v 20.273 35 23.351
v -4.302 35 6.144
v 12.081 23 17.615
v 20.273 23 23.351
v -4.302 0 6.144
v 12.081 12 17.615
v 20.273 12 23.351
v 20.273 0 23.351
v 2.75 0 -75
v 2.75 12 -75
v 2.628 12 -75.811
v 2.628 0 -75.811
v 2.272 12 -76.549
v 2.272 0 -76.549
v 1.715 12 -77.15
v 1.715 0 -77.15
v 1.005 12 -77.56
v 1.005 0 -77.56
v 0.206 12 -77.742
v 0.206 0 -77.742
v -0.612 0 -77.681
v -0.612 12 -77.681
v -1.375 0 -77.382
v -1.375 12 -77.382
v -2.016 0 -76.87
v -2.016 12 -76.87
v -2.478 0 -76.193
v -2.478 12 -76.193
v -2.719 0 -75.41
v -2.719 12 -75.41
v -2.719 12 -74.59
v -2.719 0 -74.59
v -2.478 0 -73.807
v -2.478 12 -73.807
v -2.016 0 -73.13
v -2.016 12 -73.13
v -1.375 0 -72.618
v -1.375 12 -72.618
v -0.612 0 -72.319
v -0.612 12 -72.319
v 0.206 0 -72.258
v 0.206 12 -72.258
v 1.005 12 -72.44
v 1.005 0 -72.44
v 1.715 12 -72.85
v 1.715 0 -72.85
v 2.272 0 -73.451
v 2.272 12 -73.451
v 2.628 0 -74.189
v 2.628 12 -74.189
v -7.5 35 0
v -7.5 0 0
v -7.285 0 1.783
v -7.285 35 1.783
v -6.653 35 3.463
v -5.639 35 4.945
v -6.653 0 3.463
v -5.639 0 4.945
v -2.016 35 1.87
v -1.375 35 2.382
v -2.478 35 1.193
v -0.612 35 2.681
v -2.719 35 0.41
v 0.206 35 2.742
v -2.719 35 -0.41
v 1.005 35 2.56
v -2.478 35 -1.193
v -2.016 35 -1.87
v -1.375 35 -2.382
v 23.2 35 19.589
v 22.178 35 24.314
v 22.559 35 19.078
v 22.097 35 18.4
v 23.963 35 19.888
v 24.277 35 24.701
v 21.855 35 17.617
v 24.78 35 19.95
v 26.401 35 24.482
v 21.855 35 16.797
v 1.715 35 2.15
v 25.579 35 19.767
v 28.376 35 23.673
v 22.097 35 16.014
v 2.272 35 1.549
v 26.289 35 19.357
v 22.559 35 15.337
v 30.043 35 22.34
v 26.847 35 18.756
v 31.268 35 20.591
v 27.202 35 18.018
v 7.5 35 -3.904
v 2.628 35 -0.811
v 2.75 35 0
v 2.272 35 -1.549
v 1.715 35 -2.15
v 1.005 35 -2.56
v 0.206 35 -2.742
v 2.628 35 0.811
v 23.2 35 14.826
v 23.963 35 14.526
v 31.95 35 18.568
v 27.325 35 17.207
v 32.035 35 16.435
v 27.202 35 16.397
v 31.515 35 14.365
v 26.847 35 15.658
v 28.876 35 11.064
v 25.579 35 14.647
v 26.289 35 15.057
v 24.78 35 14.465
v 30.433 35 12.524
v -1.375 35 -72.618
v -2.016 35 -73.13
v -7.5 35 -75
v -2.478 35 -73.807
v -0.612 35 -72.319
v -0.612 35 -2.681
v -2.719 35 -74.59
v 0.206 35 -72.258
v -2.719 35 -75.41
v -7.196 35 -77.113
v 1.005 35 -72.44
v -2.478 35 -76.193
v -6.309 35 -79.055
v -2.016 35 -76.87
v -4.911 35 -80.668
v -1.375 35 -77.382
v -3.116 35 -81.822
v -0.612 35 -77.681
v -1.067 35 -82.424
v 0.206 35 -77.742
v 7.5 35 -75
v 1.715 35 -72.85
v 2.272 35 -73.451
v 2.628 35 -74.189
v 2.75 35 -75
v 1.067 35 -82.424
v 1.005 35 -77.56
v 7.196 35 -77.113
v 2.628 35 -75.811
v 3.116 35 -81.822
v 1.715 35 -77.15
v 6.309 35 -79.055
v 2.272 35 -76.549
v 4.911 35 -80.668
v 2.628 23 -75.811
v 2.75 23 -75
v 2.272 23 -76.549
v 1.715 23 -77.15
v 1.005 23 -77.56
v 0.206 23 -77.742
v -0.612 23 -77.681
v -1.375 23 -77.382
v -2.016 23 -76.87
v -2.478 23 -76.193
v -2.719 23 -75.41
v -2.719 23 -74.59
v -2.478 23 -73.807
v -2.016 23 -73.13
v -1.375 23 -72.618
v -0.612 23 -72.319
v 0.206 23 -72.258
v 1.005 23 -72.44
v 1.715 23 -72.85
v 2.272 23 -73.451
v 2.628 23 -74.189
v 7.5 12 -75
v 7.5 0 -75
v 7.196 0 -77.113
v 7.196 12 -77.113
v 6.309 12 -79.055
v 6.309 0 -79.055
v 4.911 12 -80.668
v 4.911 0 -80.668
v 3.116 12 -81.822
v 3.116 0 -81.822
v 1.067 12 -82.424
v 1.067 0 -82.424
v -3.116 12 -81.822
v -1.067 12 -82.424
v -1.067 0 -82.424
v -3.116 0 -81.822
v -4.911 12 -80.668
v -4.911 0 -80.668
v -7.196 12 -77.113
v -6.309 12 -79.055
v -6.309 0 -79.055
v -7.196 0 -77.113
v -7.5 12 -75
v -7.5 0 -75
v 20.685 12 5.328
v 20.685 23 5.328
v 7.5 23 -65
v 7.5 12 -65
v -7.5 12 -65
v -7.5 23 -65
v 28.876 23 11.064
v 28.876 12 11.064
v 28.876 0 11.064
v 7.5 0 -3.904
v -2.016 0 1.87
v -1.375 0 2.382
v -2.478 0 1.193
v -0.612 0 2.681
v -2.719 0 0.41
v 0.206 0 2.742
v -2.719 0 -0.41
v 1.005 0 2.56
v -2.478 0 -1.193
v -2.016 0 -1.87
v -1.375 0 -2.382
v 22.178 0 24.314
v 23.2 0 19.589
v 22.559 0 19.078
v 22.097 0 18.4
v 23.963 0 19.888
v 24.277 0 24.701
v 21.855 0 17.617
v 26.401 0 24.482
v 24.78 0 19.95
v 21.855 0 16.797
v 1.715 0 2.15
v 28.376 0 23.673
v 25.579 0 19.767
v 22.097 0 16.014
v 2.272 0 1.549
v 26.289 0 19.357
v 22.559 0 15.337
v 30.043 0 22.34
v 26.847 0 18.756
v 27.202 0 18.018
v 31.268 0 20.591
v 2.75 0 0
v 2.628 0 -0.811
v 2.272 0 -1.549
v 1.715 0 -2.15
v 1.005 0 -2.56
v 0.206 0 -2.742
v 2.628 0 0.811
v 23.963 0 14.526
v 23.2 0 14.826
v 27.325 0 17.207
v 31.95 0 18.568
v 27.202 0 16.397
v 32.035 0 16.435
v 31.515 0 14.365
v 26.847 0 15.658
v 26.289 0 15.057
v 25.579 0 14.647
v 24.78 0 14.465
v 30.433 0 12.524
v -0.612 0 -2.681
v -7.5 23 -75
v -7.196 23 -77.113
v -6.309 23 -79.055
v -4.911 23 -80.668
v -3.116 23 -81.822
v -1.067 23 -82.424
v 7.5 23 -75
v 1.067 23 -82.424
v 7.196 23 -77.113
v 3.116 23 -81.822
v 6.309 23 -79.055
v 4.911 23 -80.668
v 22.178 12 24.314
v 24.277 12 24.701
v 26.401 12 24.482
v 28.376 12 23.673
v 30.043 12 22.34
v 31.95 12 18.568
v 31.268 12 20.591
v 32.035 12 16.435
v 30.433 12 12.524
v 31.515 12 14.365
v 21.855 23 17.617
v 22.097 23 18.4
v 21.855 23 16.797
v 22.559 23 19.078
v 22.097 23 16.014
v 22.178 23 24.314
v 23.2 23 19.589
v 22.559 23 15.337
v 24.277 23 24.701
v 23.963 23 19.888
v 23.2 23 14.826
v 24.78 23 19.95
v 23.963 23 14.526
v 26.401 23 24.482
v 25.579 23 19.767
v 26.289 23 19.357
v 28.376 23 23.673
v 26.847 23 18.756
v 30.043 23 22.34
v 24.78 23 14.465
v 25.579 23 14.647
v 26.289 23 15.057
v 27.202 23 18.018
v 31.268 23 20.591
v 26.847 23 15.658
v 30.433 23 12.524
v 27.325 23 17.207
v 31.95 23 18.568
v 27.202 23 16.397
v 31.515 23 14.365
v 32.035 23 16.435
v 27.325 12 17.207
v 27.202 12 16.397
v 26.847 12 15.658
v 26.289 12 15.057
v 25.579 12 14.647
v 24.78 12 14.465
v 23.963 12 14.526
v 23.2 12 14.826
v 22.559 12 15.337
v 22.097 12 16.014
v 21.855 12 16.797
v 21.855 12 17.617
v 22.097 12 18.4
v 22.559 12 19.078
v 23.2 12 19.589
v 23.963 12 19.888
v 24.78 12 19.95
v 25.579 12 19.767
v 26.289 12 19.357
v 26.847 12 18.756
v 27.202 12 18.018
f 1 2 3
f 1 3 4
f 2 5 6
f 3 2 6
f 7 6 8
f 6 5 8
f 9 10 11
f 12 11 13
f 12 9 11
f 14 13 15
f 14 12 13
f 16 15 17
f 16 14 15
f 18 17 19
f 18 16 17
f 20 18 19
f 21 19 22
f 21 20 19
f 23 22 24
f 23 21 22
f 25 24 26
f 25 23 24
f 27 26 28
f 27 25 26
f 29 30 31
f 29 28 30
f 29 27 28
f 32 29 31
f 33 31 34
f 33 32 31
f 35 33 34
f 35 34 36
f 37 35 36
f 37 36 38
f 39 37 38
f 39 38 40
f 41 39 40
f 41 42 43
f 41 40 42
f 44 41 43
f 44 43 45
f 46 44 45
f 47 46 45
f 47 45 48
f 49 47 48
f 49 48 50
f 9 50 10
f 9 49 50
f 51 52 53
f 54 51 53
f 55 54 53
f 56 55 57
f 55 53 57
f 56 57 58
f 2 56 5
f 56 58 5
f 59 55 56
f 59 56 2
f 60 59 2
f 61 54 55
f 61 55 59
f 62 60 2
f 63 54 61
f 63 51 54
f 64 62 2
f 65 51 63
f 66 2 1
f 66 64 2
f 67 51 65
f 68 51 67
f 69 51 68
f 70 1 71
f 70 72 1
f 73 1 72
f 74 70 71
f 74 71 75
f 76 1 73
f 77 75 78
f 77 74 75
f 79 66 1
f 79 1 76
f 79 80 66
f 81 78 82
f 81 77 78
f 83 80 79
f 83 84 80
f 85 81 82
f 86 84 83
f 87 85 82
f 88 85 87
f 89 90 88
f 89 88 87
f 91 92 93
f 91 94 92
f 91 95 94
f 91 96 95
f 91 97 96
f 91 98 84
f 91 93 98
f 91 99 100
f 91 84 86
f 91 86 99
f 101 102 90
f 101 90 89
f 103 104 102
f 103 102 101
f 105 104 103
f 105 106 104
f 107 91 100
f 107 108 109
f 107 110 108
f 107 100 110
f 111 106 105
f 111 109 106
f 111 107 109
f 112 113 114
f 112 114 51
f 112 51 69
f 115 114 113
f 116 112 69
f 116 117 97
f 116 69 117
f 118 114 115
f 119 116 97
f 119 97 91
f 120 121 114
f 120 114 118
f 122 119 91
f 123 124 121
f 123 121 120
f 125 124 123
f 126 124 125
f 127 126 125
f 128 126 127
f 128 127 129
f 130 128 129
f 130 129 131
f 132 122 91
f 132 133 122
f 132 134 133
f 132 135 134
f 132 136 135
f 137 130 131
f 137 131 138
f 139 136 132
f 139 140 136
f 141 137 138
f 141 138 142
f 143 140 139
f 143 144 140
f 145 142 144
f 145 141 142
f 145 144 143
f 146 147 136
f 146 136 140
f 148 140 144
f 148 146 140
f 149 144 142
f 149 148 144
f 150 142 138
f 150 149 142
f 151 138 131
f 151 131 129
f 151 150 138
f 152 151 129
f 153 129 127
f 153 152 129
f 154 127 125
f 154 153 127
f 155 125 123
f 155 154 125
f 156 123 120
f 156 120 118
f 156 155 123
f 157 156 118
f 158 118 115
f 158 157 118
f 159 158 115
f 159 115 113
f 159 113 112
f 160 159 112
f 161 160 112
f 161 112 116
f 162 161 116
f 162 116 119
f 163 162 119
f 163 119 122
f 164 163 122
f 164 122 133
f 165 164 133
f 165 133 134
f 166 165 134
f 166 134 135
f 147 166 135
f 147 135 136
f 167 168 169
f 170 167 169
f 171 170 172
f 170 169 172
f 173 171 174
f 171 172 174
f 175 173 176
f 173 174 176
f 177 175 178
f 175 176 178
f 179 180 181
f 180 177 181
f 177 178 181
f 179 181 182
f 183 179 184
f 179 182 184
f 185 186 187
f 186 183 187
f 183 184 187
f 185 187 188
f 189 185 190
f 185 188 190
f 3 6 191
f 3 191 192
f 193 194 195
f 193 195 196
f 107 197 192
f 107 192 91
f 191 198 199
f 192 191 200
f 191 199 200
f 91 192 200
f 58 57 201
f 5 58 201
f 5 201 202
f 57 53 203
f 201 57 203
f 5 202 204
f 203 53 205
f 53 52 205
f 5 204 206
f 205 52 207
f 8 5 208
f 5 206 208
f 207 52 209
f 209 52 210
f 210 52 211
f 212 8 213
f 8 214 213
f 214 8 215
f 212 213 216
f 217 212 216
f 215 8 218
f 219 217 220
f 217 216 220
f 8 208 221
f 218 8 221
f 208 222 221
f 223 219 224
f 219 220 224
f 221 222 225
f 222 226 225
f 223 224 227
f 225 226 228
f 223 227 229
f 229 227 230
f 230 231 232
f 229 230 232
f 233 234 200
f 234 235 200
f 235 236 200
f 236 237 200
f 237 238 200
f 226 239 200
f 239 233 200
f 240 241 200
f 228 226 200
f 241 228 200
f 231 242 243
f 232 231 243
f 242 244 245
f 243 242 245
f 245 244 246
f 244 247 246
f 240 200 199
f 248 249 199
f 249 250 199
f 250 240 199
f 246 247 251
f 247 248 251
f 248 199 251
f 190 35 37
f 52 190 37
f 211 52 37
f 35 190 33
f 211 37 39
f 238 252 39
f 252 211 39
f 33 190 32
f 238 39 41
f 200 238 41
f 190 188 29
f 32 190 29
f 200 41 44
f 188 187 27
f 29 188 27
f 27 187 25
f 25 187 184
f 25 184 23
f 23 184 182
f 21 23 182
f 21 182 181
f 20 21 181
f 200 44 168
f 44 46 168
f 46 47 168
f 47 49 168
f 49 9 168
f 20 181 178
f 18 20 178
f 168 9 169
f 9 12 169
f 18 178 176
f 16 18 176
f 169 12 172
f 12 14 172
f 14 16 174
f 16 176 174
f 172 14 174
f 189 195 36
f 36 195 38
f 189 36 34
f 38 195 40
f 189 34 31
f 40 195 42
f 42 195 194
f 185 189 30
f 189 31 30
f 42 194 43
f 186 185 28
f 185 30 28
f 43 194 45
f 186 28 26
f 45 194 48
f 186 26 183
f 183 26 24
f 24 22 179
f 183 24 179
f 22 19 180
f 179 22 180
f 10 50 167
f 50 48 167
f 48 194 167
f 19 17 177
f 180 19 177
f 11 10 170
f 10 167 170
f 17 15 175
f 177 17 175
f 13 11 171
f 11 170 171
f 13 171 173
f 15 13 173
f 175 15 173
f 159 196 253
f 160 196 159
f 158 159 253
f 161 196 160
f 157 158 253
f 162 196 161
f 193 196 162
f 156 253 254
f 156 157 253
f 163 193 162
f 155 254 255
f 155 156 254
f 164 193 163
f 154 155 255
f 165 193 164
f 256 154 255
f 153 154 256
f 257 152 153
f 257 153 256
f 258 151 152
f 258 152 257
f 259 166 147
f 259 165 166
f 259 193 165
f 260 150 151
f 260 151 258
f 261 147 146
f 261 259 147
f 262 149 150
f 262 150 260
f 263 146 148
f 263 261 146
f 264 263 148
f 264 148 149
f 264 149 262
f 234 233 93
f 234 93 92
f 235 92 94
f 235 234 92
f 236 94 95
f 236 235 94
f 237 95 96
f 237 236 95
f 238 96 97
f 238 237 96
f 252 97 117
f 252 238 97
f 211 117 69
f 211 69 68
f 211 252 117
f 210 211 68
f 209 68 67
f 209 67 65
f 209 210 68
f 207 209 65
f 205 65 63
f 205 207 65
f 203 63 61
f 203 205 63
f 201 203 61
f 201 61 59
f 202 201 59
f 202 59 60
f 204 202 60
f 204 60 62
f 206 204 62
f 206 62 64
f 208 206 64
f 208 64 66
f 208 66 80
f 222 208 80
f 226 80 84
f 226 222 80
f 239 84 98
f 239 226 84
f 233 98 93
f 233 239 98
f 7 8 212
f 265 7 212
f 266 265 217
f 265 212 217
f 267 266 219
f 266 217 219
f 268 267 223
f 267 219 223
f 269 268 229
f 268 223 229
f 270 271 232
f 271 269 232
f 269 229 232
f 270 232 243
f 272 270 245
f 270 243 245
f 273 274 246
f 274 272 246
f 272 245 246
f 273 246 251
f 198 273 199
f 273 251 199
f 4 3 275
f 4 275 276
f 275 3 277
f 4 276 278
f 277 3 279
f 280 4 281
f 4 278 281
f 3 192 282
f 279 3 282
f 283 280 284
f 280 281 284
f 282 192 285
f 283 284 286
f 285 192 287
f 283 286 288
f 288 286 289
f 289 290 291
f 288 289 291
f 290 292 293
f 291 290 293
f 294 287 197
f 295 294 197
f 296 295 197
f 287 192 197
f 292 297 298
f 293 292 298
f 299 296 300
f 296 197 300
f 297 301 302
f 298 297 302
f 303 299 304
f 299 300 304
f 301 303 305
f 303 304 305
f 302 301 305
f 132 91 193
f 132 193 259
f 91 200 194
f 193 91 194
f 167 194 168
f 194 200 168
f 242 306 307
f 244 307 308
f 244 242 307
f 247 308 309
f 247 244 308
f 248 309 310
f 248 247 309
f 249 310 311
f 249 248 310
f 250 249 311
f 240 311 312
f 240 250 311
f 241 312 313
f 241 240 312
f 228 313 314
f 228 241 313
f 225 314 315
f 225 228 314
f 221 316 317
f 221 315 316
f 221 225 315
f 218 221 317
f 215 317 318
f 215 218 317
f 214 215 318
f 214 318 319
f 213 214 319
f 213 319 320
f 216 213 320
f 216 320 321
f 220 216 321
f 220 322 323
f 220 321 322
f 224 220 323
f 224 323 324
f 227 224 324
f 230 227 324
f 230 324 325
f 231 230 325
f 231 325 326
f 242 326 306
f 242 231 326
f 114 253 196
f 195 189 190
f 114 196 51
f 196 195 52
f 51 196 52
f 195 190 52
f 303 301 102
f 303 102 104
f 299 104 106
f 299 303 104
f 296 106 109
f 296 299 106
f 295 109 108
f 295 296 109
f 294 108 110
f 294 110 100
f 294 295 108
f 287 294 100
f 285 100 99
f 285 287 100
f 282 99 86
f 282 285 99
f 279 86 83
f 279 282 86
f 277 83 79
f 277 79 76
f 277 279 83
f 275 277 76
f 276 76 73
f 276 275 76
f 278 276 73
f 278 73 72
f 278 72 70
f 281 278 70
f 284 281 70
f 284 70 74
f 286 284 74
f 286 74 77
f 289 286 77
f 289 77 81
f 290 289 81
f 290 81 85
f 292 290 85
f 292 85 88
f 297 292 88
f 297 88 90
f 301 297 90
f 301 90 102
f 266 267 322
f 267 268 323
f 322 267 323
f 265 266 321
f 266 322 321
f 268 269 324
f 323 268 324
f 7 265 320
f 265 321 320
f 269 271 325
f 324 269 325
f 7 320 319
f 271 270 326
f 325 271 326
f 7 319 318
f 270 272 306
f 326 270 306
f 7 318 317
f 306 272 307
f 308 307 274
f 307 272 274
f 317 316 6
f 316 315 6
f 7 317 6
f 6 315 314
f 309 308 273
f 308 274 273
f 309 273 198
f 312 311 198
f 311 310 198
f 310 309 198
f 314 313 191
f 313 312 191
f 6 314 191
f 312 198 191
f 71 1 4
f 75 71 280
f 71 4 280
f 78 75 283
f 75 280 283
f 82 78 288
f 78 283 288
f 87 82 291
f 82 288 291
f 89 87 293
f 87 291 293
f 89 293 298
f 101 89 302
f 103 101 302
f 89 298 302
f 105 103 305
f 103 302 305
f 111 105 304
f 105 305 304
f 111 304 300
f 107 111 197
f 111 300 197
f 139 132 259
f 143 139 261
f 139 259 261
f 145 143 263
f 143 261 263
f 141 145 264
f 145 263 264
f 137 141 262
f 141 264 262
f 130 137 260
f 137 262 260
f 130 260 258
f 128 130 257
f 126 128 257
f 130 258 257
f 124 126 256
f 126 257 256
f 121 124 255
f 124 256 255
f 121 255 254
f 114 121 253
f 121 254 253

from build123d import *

# Parameters (mm, degrees)
SKETCH2_R           = 2.75
BOSS_EXTRUDE2_DEPTH = 35
CUT_EXTRUDE1_DEPTH  = 35
CUT_EXTRUDE2_DEPTH  = 35


with BuildPart() as part:
    # Sketch2 → Boss-Extrude2 (new body)
    with BuildSketch(Plane(origin=(0, 0, 0), x_dir=(1, 0, 0), z_dir=(0, 1, 0))):
        with BuildLine():
            Line((7.5, 3.904252879), (7.5, 75))
            ThreePointArc((7.5, 75), (0, 82.5), (-7.5, 75))
            Line((-7.5, 75), (-7.5, 0))
            ThreePointArc((-7.5, 0), (-6.652581249, -3.463114599), (-4.301823273, -6.143640332))
            Line((-4.301823273, -6.143640332), (20.272738056, -23.350933423))
            ThreePointArc((20.272738056, -23.350933423), (30.718201661, -21.509116363), (28.876384601, -11.063652758))
            Line((28.876384601, -11.063652758), (7.5, 3.904252879))
        make_face()
        Circle(SKETCH2_R, mode=Mode.SUBTRACT)
        with Locations((0, 75)):
            Circle(SKETCH2_R, mode=Mode.SUBTRACT)
        with Locations((24.574561329, -17.207293091)):
            Circle(SKETCH2_R, mode=Mode.SUBTRACT)
    extrude(amount=BOSS_EXTRUDE2_DEPTH)

    # Sketch3 → Cut-Extrude1 (cut)
    with BuildSketch(Plane(origin=(7.5, 0, 0), x_dir=(0, 0, -1), z_dir=(1, 0, 0))):
        Polygon((75, 12), (65, 12), (65, 23), (87.183204073, 23), (87.183204073, 12), align=None)
    extrude(amount=-CUT_EXTRUDE1_DEPTH, mode=Mode.SUBTRACT)

    # Sketch4 → Cut-Extrude2 (cut)
    with BuildSketch(Plane(origin=(4.301823273, 0, -6.143640332), x_dir=(-0.819152044, 0, -0.573576436), z_dir=(0.573576436, 0, -0.819152044))):
        Polygon((-30, 12), (-30, 17.5), (-30, 23), (-43.630298532, 23), (-43.630298532, 12), align=None)
        Polygon((-30, 23), (-30, 17.5), (-30, 12), (-20, 12), (-20, 23), align=None)
    extrude(amount=-CUT_EXTRUDE2_DEPTH, mode=Mode.SUBTRACT)


solid = part.part
